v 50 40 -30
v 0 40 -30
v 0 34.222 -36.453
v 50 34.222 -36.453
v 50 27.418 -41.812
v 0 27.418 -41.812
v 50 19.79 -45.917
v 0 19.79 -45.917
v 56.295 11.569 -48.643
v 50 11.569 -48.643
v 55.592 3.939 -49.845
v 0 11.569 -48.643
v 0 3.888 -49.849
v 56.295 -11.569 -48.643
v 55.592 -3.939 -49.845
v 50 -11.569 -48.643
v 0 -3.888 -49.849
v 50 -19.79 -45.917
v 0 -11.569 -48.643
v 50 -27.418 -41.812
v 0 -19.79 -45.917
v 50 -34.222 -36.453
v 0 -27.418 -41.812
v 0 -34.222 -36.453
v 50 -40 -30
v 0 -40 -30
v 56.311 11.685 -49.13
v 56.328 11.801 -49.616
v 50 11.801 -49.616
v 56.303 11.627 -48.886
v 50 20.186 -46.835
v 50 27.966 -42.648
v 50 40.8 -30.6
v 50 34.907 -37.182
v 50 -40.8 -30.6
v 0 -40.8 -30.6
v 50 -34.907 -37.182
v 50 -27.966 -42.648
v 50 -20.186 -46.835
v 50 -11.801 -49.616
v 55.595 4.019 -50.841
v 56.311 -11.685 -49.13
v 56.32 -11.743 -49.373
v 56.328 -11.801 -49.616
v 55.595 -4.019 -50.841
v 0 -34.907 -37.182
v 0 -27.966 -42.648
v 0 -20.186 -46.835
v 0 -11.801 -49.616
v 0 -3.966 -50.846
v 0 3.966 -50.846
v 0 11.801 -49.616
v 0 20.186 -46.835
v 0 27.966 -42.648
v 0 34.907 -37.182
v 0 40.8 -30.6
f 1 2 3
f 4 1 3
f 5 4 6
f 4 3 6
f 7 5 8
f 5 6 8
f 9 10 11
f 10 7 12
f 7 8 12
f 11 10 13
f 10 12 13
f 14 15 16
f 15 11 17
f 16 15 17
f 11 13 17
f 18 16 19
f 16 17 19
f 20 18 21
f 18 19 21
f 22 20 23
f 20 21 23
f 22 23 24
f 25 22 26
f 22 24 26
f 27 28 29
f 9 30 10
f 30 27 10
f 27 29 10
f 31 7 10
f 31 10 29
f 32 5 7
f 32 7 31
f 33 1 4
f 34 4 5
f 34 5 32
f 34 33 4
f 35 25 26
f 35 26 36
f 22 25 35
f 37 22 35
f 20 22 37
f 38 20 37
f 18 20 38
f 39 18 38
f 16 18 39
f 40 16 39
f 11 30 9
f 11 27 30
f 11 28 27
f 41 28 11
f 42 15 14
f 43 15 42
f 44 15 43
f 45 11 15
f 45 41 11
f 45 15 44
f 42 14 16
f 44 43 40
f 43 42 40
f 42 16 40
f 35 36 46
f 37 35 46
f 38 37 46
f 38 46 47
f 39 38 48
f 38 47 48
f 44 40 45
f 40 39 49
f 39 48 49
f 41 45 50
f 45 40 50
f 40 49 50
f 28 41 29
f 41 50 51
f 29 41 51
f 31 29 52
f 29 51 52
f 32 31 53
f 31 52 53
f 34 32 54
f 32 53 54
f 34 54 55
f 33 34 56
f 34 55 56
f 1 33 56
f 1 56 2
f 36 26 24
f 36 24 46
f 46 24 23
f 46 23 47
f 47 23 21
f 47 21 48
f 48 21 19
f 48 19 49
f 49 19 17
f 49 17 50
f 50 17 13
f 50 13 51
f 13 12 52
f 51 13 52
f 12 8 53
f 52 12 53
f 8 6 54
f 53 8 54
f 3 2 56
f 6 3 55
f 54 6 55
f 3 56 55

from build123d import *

# Parameters (mm, degrees)
BOSS_EXTRUDE1_DEPTH   = 50
BOSS_EXTRUDE1_2_DEPTH = 50
BOSS_EXTRUDE2_DEPTH   = 55.499654918
BOSS_EXTRUDE2_START   = 55.499654918
BOSS_EXTRUDE2_2_DEPTH = 0.828043858
BOSS_EXTRUDE2_START_2 = -52
BOSS_EXTRUDE2_3_DEPTH = 4


with BuildPart() as part:
    # airflap → Boss-Extrude1 (new body)
    with BuildSketch(Plane(origin=(0, 0, 0), x_dir=(0, 0, -1), z_dir=(1, 0, 0))):
        with BuildLine():
            ThreePointArc((49.615981669, 11.800608587), (42.648471302, 27.966192012), (30.6, 40.8))
            Line((30.6, 40.8), (30, 40))
            ThreePointArc((30, 40), (41.812226766, 27.417835306), (48.643119283, 11.569224105))
            Line((48.643119283, 11.569224105), (49.615981669, 11.800608587))
        make_face()
    extrude(amount=BOSS_EXTRUDE1_DEPTH)



with BuildPart() as body_2:
    # airflap → Boss-Extrude1 2 (new body)
    with BuildSketch(Plane(origin=(0, 0, 0), x_dir=(0, 0, -1), z_dir=(1, 0, 0))):
        with BuildLine():
            ThreePointArc((30.6, -40.8), (42.648471302, -27.966192012), (49.615981669, -11.800608587))
            Line((49.615981669, -11.800608587), (48.643119283, -11.569224105))
            ThreePointArc((48.643119283, -11.569224105), (41.812226766, -27.417835306), (30, -40))
            Line((30, -40), (30.6, -40.8))
        make_face()
    extrude(amount=BOSS_EXTRUDE1_2_DEPTH)


with BuildPart() as part_1:
    add(part.part)

    add(body_2.part)  # Boss-Extrude2 merges body 2
    # Boss-Extrude2: read off the stored shape, not the designer's step
    # Boss-Extrude2 outline → Boss-Extrude2 (add)
    with BuildSketch(Plane(origin=(0, 0, 0), x_dir=(0, 0, -1), z_dir=(1, 0, 0))):
        with BuildLine():
            ThreePointArc((49.615981669, -11.800608587), (51, 0), (49.615981669, 11.800608587))
            Line((49.615981669, 11.800608587), (48.643119283, 11.569224105))
            ThreePointArc((48.643119283, 11.569224105), (50, 0), (48.643119283, -11.569224105))
            Line((48.643119283, -11.569224105), (49.615981669, -11.800608587))
        make_face()
    extrude(amount=BOSS_EXTRUDE2_DEPTH)

    # Boss-Extrude2 2 outline → Boss-Extrude2 2 (add)
    with BuildSketch(Plane.YZ.offset(BOSS_EXTRUDE2_START)):
        with BuildLine():
            Line((11.800608587, -49.615981669), (11.569224105, -48.643119283))
            ThreePointArc((11.569224105, -48.643119283), (0, -50), (-11.569224105, -48.643119283))
            Line((-11.569224105, -48.643119283), (-11.800608587, -49.615981669))
            ThreePointArc((-11.800608587, -49.615981669), (0, -51), (11.800608587, -49.615981669))
        make_face()
    extrude(amount=BOSS_EXTRUDE2_2_DEPTH)

    # Boss-Extrude2 3 outline → Boss-Extrude2 3 (cut)
    with BuildSketch(Plane.XY.offset(BOSS_EXTRUDE2_START_2)):
        with BuildLine():
            ThreePointArc((56.327698776, 11.800608587), (55.499651286, 0), (56.327698776, -11.800608587))
            Line((56.327698776, -11.800608587), (56.327698776, 11.800608587))
        make_face()
    extrude(amount=BOSS_EXTRUDE2_3_DEPTH, mode=Mode.SUBTRACT)


solid = part_1.part
